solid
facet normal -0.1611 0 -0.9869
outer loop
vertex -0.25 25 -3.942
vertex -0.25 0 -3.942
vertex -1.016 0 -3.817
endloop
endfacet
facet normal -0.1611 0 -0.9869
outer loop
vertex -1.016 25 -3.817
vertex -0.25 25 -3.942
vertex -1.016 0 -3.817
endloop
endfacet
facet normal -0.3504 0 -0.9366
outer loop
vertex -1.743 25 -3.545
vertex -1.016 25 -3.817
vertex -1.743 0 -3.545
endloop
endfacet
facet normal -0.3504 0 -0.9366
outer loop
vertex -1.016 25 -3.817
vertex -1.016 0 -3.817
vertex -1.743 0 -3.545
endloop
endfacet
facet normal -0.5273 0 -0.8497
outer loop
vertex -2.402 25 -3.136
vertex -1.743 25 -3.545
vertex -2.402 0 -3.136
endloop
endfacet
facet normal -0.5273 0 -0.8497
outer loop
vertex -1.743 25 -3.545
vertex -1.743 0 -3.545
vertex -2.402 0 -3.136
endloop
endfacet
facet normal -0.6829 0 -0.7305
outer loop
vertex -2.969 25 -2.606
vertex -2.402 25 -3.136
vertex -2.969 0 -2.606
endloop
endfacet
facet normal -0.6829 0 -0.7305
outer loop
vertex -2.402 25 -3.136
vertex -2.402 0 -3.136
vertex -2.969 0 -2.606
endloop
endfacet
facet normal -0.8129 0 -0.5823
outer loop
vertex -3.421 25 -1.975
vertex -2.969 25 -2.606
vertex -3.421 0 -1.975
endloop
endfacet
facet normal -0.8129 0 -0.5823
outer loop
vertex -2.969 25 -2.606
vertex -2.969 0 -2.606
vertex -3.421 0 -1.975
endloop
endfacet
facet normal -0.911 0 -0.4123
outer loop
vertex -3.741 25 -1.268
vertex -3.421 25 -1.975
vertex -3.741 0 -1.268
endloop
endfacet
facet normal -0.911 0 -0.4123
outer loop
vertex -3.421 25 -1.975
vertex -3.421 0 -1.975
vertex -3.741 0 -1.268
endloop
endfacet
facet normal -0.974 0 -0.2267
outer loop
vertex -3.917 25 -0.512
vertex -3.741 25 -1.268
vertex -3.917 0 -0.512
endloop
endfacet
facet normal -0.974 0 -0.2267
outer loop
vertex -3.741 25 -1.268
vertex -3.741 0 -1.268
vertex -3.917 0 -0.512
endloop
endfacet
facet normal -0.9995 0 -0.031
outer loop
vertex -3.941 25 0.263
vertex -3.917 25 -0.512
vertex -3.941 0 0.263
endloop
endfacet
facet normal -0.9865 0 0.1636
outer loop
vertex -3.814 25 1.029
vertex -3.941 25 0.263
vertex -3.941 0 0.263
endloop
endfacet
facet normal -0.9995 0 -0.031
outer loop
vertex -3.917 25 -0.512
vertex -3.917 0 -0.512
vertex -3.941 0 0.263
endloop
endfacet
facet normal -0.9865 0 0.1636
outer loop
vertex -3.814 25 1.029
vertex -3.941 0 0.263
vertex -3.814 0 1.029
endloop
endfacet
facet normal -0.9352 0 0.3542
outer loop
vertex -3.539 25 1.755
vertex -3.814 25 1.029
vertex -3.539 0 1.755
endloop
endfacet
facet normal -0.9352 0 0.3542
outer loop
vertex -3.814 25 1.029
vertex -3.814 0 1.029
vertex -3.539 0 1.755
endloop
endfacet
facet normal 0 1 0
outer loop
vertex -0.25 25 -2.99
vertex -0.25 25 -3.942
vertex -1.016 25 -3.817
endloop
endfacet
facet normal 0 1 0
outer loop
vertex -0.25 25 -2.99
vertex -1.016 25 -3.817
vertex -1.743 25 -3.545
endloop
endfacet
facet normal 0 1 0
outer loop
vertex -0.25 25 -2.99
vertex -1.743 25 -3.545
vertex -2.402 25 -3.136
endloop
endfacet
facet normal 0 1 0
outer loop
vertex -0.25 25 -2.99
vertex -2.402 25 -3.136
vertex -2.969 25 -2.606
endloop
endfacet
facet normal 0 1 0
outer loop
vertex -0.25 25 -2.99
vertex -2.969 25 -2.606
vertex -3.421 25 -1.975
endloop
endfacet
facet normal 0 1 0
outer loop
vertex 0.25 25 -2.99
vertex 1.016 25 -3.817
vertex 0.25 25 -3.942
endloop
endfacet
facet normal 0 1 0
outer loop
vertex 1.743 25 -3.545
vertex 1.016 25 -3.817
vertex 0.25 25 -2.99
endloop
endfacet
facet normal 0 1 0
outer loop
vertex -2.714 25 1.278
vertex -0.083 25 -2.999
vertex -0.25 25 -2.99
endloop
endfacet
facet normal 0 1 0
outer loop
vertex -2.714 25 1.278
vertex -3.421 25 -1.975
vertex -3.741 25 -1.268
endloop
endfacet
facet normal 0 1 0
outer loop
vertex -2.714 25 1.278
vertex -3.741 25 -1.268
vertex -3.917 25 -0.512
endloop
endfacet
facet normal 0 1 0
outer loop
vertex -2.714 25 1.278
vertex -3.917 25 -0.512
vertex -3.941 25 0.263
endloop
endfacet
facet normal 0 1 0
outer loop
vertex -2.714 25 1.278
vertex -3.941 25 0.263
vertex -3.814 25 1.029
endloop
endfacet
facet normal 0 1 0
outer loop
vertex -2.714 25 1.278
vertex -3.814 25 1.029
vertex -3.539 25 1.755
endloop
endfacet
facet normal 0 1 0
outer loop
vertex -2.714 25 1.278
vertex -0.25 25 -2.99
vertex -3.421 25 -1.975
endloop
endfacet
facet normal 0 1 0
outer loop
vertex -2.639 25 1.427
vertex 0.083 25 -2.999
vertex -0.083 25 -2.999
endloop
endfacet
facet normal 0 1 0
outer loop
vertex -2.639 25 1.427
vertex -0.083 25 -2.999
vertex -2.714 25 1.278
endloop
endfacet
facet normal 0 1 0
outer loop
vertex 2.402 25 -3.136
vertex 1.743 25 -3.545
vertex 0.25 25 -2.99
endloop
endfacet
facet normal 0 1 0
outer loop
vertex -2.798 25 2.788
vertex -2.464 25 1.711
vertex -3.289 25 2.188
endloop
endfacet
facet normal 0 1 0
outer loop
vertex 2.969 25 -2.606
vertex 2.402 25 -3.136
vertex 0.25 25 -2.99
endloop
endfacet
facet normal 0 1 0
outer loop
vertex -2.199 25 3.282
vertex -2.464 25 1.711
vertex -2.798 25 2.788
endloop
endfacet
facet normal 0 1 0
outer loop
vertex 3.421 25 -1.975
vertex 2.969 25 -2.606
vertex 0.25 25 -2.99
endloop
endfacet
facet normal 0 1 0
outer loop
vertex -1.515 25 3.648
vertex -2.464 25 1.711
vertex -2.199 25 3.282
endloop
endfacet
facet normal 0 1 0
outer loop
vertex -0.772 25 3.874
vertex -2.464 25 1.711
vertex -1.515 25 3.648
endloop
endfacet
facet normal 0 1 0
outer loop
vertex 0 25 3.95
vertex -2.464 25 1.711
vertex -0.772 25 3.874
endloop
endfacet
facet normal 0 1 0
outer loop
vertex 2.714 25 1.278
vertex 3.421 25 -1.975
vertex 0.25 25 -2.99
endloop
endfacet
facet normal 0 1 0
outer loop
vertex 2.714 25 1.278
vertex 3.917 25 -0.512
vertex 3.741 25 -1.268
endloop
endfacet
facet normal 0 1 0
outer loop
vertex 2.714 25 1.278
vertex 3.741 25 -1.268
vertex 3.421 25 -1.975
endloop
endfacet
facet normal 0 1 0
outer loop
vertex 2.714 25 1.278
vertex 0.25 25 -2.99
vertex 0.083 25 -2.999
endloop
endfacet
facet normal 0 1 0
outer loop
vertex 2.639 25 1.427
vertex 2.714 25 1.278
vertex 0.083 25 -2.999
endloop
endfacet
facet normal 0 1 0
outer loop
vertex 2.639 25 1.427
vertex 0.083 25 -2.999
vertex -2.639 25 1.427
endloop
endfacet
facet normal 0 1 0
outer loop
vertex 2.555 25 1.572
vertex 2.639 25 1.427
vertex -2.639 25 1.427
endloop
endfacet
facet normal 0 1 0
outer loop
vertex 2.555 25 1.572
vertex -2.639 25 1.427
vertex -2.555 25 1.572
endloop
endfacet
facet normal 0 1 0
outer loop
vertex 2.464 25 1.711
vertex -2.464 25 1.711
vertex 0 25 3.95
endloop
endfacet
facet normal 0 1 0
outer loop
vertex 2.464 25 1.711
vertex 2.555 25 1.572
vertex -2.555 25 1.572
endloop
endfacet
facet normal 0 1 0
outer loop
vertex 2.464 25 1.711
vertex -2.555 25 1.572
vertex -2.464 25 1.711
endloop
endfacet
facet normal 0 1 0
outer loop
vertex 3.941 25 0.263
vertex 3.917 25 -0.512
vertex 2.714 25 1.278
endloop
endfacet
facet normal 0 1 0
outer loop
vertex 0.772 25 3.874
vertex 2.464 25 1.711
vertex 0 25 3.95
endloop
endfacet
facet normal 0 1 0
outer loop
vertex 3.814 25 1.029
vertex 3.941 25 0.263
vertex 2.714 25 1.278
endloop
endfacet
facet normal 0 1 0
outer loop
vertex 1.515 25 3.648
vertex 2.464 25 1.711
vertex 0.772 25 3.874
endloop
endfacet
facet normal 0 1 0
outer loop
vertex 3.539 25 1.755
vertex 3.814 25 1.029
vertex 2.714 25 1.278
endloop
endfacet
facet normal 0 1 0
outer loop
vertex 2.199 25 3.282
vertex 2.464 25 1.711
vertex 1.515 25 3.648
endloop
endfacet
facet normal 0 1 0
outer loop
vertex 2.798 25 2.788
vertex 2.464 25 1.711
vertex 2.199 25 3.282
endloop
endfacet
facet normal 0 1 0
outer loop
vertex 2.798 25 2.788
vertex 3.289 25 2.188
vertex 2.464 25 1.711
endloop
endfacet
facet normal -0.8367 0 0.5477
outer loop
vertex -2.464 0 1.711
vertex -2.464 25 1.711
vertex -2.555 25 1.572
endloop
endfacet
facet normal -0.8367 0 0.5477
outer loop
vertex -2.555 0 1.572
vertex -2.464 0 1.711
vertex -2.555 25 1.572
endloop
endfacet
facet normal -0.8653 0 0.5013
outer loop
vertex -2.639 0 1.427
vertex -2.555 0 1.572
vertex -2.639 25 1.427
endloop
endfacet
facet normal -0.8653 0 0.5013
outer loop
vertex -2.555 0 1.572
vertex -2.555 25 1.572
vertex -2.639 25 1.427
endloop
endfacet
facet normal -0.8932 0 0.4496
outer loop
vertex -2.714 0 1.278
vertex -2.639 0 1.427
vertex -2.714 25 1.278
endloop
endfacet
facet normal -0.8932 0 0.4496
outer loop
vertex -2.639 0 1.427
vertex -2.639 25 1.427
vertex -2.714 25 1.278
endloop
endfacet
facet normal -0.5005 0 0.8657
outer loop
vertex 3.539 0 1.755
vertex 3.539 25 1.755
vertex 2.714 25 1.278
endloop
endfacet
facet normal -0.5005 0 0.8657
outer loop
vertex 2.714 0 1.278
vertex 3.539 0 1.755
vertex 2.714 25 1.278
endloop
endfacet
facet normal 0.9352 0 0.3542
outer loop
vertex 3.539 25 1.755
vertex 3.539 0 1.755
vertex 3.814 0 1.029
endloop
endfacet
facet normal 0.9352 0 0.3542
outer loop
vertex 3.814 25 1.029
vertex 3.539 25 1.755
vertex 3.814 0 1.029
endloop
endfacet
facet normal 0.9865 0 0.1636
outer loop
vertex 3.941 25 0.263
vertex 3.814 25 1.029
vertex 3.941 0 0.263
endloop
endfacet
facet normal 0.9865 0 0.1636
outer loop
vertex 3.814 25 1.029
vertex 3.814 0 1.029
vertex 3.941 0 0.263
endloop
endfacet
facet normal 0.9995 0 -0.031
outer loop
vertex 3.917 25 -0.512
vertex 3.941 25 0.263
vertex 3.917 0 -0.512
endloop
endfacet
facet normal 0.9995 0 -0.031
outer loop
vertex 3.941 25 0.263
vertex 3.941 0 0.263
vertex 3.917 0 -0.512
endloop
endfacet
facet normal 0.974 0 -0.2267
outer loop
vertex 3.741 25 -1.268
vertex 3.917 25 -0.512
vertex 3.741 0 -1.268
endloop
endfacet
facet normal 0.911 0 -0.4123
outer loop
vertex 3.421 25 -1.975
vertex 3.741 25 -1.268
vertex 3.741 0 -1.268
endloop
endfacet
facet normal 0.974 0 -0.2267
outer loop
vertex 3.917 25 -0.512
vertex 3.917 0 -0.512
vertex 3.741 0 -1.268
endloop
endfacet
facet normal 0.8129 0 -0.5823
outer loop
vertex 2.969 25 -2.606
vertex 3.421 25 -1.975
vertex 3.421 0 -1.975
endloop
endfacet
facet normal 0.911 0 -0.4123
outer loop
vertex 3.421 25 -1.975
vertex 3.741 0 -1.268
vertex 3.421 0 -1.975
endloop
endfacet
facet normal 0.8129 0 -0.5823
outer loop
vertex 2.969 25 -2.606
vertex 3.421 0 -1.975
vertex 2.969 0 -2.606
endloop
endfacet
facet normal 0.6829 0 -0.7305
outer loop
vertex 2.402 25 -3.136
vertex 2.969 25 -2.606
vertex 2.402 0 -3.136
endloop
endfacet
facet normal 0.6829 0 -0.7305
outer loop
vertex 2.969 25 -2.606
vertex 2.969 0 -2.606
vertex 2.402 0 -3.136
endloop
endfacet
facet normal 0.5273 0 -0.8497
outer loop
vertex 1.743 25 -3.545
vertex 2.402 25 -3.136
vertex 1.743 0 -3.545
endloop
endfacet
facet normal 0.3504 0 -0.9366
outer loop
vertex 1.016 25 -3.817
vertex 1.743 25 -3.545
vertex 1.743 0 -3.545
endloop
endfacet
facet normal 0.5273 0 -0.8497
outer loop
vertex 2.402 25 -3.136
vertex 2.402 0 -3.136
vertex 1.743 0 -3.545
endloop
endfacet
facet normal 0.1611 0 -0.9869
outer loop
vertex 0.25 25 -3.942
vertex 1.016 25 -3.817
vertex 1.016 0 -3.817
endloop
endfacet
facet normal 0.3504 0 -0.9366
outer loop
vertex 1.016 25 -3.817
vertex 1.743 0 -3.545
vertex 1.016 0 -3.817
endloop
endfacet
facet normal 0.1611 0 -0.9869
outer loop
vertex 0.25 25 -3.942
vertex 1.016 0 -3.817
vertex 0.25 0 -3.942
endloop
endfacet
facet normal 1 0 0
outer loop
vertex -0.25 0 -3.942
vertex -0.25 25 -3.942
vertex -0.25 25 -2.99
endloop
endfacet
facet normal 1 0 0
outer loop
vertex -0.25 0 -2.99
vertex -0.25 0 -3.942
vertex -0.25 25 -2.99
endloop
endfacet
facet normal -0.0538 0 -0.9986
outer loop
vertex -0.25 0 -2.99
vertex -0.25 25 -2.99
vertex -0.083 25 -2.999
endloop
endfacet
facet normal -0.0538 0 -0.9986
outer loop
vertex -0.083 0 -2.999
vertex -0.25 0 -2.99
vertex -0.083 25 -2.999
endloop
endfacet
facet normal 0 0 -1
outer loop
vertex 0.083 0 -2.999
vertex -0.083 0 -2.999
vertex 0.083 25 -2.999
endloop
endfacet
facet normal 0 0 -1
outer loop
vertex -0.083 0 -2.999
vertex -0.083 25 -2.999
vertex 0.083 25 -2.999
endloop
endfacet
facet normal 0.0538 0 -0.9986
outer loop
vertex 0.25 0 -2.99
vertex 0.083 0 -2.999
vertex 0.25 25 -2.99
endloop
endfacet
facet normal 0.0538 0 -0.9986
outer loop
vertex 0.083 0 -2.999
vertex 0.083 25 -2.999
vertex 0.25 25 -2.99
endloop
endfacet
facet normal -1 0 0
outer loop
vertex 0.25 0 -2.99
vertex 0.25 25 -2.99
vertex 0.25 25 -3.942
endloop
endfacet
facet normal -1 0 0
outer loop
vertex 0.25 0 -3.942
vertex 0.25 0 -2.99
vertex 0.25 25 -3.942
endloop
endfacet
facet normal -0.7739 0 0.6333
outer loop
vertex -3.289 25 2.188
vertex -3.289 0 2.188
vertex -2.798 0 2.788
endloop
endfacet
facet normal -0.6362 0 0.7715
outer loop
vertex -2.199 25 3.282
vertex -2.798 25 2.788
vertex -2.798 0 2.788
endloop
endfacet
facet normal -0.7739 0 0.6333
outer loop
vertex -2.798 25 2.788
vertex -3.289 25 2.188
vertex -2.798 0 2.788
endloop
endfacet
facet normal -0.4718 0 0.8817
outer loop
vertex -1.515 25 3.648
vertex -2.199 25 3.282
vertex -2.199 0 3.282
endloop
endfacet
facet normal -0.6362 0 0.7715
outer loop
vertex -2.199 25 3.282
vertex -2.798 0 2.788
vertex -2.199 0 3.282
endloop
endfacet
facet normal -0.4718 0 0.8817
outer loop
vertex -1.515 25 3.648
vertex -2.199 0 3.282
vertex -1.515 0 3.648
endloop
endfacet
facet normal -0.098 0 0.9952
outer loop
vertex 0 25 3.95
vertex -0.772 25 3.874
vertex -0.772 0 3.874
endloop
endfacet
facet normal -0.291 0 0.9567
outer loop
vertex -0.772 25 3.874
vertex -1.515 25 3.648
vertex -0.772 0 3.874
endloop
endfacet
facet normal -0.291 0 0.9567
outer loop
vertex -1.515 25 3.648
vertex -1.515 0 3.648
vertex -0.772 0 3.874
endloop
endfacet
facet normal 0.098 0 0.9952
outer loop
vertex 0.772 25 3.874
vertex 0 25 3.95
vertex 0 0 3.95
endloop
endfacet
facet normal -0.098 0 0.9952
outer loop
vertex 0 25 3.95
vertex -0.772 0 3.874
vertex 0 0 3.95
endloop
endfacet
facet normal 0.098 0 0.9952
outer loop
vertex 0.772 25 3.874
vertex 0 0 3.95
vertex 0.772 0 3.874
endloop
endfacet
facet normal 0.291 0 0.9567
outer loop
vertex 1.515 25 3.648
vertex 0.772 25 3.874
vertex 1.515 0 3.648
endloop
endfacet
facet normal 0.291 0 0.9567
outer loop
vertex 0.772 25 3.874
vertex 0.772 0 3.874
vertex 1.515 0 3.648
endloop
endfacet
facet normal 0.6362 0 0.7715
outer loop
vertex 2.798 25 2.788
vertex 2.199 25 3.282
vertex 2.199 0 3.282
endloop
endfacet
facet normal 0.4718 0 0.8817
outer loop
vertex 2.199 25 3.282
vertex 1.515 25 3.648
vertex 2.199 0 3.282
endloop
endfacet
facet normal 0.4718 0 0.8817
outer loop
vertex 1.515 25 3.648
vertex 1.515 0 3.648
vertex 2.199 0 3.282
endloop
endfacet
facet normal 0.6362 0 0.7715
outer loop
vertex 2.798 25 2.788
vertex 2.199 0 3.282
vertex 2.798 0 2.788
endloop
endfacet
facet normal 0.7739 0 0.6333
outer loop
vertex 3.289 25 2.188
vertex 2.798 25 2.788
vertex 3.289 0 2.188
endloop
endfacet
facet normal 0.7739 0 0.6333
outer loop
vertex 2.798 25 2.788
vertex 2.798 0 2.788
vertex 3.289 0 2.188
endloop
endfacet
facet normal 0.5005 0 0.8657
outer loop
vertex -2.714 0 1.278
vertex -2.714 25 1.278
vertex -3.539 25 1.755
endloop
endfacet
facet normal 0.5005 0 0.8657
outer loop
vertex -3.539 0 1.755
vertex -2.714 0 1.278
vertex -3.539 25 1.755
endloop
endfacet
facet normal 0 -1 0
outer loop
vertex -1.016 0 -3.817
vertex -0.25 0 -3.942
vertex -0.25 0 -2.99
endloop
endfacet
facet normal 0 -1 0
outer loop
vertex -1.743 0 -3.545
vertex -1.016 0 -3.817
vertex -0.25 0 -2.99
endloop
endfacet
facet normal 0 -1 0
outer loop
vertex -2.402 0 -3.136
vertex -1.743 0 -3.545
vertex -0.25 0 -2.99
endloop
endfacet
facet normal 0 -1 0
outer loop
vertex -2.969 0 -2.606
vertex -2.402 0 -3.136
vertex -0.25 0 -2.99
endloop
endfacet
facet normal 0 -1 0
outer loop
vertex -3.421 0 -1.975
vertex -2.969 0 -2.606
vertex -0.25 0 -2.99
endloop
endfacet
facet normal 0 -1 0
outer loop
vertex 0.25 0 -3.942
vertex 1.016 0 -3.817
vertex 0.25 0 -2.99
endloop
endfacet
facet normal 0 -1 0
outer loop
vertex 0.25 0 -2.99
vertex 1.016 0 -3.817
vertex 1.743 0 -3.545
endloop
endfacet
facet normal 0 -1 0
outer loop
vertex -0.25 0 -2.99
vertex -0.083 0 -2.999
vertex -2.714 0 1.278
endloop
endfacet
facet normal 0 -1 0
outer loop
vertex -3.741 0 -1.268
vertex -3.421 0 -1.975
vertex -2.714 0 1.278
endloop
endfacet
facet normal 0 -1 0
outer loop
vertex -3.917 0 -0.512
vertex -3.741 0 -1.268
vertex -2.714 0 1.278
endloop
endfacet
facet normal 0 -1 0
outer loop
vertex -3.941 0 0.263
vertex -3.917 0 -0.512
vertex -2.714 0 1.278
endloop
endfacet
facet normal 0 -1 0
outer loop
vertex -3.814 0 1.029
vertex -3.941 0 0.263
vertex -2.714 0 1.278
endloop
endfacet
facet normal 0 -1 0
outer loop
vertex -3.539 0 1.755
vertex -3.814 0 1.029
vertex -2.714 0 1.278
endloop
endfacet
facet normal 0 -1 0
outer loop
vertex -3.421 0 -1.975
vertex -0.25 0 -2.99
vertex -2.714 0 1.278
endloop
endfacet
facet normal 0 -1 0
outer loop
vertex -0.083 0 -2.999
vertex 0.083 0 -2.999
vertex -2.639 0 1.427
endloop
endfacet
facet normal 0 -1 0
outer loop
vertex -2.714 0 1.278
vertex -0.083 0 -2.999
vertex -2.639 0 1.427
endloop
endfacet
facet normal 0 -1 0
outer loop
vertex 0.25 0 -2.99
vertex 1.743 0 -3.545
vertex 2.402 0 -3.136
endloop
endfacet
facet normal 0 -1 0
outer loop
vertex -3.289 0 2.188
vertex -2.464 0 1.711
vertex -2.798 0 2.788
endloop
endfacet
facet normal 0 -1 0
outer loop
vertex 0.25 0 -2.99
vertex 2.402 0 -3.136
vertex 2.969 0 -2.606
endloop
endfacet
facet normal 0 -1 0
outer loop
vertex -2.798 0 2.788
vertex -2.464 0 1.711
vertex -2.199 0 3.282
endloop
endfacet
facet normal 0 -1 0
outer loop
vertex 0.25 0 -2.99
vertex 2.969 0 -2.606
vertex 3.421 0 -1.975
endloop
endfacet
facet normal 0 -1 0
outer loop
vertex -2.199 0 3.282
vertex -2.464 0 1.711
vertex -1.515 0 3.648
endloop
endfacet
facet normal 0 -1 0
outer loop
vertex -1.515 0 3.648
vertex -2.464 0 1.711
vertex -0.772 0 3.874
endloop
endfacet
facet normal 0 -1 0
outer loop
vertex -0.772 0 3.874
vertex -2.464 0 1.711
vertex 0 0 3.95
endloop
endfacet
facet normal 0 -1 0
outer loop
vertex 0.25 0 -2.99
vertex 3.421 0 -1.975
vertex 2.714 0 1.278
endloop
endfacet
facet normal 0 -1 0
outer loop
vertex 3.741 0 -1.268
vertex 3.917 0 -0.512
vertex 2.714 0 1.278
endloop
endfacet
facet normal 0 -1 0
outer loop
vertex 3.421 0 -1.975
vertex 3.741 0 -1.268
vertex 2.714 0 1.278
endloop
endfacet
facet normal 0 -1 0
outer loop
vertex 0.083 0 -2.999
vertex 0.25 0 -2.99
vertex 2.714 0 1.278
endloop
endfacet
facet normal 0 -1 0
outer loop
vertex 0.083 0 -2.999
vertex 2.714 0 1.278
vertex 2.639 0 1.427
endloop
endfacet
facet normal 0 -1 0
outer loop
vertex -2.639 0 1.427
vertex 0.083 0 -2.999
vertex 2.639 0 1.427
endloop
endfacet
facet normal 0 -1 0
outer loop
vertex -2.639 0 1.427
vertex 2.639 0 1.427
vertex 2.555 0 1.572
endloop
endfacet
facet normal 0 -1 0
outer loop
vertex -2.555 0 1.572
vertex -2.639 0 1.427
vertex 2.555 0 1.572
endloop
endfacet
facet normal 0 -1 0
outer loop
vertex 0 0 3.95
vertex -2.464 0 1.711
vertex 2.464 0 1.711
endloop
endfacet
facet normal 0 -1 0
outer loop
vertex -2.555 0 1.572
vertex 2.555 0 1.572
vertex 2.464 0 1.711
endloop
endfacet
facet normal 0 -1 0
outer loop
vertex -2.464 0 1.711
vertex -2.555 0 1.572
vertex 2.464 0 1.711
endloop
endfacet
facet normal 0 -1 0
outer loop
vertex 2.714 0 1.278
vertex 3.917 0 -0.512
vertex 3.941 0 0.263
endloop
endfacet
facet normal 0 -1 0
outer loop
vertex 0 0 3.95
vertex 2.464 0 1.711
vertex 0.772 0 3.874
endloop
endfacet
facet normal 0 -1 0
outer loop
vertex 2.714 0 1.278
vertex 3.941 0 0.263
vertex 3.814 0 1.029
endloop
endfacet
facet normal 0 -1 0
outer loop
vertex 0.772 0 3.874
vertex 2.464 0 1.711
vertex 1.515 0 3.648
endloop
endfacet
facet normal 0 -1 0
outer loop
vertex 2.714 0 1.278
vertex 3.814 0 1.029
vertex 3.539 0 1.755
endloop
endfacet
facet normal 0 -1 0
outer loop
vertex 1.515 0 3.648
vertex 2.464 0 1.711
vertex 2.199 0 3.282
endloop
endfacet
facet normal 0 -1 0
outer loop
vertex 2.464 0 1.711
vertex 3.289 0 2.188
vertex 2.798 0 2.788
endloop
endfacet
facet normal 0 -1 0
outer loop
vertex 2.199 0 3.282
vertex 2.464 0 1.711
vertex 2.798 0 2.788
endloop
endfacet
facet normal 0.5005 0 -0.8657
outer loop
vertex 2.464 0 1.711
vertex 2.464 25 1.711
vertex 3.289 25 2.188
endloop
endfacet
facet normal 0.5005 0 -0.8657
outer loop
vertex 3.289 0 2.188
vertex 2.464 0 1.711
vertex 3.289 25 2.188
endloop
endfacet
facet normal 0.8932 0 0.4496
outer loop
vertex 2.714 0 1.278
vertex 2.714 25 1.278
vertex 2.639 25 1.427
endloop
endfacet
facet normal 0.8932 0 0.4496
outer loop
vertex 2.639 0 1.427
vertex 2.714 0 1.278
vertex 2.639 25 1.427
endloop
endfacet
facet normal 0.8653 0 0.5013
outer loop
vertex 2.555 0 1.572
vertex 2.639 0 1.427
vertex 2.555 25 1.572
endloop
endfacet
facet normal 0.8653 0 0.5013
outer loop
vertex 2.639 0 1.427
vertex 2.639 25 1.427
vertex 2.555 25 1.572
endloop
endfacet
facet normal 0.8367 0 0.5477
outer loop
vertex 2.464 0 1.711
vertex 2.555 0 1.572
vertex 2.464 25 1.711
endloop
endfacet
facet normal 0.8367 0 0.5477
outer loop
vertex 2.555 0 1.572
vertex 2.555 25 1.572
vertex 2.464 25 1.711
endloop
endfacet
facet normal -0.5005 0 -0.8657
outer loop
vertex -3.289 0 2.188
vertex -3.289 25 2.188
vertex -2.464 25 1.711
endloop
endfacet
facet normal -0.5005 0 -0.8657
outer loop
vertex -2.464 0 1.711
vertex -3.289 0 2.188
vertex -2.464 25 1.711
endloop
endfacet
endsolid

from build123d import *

# Parameters (mm, degrees)
SKETCH1_R           = 3.95
BOSS_EXTRUDE1_DEPTH = 25
CUT_EXTRUDE1_DEPTH  = 25


with BuildPart() as part:
    # Sketch1 → Boss-Extrude1 (new body)
    with BuildSketch(Plane(origin=(0, 0, 0), x_dir=(1, 0, 0), z_dir=(0, 1, 0))):
        with Locations(Location((0, 0, 0), (0, 0, 270))):
            Circle(SKETCH1_R)
    extrude(amount=BOSS_EXTRUDE1_DEPTH)

    # Sketch2 → Cut-Extrude1 (cut)
    with BuildSketch(Plane(origin=(0, 25, 0), x_dir=(1, 0, 0), z_dir=(0, 1, 0))):
        with BuildLine():
            ThreePointArc((-0.25, 2.989565186), (0, 3), (0.25, 2.989565186))
            Line((0.25, 2.989565186), (0.25, 3.942080669))
            Line((0.25, 3.942080669), (-0.25, 3.942080669))
            Line((-0.25, 3.942080669), (-0.25, 2.989565186))
        make_face()
        with BuildLine():
            Line((-3.288942003, -2.187546685), (-2.464039397, -1.711288944))
            ThreePointArc((-2.464039397, -1.711288944), (-2.598076211, -1.5), (-2.714039397, -1.278276242))
            Line((-2.714039397, -1.278276242), (-3.538942003, -1.754533983))
            Line((-3.538942003, -1.754533983), (-3.288942003, -2.187546685))
        make_face()
        with BuildLine():
            Line((3.538942003, -1.754533983), (2.714039397, -1.278276242))
            ThreePointArc((2.714039397, -1.278276242), (2.598076211, -1.5), (2.464039397, -1.711288944))
            Line((2.464039397, -1.711288944), (3.288942003, -2.187546685))
            Line((3.288942003, -2.187546685), (3.538942003, -1.754533983))
        make_face()
    extrude(amount=-CUT_EXTRUDE1_DEPTH, mode=Mode.SUBTRACT)


with BuildPart() as cut_extrude1_kept_piece:
    # of the separate pieces the step leaves, the one the design keeps (cut_extrude1_pieces_kept)
    add(part.part.solids().sort_by_distance((2.464039397, 25, 1.711288944))[0])


solid = cut_extrude1_kept_piece.part
